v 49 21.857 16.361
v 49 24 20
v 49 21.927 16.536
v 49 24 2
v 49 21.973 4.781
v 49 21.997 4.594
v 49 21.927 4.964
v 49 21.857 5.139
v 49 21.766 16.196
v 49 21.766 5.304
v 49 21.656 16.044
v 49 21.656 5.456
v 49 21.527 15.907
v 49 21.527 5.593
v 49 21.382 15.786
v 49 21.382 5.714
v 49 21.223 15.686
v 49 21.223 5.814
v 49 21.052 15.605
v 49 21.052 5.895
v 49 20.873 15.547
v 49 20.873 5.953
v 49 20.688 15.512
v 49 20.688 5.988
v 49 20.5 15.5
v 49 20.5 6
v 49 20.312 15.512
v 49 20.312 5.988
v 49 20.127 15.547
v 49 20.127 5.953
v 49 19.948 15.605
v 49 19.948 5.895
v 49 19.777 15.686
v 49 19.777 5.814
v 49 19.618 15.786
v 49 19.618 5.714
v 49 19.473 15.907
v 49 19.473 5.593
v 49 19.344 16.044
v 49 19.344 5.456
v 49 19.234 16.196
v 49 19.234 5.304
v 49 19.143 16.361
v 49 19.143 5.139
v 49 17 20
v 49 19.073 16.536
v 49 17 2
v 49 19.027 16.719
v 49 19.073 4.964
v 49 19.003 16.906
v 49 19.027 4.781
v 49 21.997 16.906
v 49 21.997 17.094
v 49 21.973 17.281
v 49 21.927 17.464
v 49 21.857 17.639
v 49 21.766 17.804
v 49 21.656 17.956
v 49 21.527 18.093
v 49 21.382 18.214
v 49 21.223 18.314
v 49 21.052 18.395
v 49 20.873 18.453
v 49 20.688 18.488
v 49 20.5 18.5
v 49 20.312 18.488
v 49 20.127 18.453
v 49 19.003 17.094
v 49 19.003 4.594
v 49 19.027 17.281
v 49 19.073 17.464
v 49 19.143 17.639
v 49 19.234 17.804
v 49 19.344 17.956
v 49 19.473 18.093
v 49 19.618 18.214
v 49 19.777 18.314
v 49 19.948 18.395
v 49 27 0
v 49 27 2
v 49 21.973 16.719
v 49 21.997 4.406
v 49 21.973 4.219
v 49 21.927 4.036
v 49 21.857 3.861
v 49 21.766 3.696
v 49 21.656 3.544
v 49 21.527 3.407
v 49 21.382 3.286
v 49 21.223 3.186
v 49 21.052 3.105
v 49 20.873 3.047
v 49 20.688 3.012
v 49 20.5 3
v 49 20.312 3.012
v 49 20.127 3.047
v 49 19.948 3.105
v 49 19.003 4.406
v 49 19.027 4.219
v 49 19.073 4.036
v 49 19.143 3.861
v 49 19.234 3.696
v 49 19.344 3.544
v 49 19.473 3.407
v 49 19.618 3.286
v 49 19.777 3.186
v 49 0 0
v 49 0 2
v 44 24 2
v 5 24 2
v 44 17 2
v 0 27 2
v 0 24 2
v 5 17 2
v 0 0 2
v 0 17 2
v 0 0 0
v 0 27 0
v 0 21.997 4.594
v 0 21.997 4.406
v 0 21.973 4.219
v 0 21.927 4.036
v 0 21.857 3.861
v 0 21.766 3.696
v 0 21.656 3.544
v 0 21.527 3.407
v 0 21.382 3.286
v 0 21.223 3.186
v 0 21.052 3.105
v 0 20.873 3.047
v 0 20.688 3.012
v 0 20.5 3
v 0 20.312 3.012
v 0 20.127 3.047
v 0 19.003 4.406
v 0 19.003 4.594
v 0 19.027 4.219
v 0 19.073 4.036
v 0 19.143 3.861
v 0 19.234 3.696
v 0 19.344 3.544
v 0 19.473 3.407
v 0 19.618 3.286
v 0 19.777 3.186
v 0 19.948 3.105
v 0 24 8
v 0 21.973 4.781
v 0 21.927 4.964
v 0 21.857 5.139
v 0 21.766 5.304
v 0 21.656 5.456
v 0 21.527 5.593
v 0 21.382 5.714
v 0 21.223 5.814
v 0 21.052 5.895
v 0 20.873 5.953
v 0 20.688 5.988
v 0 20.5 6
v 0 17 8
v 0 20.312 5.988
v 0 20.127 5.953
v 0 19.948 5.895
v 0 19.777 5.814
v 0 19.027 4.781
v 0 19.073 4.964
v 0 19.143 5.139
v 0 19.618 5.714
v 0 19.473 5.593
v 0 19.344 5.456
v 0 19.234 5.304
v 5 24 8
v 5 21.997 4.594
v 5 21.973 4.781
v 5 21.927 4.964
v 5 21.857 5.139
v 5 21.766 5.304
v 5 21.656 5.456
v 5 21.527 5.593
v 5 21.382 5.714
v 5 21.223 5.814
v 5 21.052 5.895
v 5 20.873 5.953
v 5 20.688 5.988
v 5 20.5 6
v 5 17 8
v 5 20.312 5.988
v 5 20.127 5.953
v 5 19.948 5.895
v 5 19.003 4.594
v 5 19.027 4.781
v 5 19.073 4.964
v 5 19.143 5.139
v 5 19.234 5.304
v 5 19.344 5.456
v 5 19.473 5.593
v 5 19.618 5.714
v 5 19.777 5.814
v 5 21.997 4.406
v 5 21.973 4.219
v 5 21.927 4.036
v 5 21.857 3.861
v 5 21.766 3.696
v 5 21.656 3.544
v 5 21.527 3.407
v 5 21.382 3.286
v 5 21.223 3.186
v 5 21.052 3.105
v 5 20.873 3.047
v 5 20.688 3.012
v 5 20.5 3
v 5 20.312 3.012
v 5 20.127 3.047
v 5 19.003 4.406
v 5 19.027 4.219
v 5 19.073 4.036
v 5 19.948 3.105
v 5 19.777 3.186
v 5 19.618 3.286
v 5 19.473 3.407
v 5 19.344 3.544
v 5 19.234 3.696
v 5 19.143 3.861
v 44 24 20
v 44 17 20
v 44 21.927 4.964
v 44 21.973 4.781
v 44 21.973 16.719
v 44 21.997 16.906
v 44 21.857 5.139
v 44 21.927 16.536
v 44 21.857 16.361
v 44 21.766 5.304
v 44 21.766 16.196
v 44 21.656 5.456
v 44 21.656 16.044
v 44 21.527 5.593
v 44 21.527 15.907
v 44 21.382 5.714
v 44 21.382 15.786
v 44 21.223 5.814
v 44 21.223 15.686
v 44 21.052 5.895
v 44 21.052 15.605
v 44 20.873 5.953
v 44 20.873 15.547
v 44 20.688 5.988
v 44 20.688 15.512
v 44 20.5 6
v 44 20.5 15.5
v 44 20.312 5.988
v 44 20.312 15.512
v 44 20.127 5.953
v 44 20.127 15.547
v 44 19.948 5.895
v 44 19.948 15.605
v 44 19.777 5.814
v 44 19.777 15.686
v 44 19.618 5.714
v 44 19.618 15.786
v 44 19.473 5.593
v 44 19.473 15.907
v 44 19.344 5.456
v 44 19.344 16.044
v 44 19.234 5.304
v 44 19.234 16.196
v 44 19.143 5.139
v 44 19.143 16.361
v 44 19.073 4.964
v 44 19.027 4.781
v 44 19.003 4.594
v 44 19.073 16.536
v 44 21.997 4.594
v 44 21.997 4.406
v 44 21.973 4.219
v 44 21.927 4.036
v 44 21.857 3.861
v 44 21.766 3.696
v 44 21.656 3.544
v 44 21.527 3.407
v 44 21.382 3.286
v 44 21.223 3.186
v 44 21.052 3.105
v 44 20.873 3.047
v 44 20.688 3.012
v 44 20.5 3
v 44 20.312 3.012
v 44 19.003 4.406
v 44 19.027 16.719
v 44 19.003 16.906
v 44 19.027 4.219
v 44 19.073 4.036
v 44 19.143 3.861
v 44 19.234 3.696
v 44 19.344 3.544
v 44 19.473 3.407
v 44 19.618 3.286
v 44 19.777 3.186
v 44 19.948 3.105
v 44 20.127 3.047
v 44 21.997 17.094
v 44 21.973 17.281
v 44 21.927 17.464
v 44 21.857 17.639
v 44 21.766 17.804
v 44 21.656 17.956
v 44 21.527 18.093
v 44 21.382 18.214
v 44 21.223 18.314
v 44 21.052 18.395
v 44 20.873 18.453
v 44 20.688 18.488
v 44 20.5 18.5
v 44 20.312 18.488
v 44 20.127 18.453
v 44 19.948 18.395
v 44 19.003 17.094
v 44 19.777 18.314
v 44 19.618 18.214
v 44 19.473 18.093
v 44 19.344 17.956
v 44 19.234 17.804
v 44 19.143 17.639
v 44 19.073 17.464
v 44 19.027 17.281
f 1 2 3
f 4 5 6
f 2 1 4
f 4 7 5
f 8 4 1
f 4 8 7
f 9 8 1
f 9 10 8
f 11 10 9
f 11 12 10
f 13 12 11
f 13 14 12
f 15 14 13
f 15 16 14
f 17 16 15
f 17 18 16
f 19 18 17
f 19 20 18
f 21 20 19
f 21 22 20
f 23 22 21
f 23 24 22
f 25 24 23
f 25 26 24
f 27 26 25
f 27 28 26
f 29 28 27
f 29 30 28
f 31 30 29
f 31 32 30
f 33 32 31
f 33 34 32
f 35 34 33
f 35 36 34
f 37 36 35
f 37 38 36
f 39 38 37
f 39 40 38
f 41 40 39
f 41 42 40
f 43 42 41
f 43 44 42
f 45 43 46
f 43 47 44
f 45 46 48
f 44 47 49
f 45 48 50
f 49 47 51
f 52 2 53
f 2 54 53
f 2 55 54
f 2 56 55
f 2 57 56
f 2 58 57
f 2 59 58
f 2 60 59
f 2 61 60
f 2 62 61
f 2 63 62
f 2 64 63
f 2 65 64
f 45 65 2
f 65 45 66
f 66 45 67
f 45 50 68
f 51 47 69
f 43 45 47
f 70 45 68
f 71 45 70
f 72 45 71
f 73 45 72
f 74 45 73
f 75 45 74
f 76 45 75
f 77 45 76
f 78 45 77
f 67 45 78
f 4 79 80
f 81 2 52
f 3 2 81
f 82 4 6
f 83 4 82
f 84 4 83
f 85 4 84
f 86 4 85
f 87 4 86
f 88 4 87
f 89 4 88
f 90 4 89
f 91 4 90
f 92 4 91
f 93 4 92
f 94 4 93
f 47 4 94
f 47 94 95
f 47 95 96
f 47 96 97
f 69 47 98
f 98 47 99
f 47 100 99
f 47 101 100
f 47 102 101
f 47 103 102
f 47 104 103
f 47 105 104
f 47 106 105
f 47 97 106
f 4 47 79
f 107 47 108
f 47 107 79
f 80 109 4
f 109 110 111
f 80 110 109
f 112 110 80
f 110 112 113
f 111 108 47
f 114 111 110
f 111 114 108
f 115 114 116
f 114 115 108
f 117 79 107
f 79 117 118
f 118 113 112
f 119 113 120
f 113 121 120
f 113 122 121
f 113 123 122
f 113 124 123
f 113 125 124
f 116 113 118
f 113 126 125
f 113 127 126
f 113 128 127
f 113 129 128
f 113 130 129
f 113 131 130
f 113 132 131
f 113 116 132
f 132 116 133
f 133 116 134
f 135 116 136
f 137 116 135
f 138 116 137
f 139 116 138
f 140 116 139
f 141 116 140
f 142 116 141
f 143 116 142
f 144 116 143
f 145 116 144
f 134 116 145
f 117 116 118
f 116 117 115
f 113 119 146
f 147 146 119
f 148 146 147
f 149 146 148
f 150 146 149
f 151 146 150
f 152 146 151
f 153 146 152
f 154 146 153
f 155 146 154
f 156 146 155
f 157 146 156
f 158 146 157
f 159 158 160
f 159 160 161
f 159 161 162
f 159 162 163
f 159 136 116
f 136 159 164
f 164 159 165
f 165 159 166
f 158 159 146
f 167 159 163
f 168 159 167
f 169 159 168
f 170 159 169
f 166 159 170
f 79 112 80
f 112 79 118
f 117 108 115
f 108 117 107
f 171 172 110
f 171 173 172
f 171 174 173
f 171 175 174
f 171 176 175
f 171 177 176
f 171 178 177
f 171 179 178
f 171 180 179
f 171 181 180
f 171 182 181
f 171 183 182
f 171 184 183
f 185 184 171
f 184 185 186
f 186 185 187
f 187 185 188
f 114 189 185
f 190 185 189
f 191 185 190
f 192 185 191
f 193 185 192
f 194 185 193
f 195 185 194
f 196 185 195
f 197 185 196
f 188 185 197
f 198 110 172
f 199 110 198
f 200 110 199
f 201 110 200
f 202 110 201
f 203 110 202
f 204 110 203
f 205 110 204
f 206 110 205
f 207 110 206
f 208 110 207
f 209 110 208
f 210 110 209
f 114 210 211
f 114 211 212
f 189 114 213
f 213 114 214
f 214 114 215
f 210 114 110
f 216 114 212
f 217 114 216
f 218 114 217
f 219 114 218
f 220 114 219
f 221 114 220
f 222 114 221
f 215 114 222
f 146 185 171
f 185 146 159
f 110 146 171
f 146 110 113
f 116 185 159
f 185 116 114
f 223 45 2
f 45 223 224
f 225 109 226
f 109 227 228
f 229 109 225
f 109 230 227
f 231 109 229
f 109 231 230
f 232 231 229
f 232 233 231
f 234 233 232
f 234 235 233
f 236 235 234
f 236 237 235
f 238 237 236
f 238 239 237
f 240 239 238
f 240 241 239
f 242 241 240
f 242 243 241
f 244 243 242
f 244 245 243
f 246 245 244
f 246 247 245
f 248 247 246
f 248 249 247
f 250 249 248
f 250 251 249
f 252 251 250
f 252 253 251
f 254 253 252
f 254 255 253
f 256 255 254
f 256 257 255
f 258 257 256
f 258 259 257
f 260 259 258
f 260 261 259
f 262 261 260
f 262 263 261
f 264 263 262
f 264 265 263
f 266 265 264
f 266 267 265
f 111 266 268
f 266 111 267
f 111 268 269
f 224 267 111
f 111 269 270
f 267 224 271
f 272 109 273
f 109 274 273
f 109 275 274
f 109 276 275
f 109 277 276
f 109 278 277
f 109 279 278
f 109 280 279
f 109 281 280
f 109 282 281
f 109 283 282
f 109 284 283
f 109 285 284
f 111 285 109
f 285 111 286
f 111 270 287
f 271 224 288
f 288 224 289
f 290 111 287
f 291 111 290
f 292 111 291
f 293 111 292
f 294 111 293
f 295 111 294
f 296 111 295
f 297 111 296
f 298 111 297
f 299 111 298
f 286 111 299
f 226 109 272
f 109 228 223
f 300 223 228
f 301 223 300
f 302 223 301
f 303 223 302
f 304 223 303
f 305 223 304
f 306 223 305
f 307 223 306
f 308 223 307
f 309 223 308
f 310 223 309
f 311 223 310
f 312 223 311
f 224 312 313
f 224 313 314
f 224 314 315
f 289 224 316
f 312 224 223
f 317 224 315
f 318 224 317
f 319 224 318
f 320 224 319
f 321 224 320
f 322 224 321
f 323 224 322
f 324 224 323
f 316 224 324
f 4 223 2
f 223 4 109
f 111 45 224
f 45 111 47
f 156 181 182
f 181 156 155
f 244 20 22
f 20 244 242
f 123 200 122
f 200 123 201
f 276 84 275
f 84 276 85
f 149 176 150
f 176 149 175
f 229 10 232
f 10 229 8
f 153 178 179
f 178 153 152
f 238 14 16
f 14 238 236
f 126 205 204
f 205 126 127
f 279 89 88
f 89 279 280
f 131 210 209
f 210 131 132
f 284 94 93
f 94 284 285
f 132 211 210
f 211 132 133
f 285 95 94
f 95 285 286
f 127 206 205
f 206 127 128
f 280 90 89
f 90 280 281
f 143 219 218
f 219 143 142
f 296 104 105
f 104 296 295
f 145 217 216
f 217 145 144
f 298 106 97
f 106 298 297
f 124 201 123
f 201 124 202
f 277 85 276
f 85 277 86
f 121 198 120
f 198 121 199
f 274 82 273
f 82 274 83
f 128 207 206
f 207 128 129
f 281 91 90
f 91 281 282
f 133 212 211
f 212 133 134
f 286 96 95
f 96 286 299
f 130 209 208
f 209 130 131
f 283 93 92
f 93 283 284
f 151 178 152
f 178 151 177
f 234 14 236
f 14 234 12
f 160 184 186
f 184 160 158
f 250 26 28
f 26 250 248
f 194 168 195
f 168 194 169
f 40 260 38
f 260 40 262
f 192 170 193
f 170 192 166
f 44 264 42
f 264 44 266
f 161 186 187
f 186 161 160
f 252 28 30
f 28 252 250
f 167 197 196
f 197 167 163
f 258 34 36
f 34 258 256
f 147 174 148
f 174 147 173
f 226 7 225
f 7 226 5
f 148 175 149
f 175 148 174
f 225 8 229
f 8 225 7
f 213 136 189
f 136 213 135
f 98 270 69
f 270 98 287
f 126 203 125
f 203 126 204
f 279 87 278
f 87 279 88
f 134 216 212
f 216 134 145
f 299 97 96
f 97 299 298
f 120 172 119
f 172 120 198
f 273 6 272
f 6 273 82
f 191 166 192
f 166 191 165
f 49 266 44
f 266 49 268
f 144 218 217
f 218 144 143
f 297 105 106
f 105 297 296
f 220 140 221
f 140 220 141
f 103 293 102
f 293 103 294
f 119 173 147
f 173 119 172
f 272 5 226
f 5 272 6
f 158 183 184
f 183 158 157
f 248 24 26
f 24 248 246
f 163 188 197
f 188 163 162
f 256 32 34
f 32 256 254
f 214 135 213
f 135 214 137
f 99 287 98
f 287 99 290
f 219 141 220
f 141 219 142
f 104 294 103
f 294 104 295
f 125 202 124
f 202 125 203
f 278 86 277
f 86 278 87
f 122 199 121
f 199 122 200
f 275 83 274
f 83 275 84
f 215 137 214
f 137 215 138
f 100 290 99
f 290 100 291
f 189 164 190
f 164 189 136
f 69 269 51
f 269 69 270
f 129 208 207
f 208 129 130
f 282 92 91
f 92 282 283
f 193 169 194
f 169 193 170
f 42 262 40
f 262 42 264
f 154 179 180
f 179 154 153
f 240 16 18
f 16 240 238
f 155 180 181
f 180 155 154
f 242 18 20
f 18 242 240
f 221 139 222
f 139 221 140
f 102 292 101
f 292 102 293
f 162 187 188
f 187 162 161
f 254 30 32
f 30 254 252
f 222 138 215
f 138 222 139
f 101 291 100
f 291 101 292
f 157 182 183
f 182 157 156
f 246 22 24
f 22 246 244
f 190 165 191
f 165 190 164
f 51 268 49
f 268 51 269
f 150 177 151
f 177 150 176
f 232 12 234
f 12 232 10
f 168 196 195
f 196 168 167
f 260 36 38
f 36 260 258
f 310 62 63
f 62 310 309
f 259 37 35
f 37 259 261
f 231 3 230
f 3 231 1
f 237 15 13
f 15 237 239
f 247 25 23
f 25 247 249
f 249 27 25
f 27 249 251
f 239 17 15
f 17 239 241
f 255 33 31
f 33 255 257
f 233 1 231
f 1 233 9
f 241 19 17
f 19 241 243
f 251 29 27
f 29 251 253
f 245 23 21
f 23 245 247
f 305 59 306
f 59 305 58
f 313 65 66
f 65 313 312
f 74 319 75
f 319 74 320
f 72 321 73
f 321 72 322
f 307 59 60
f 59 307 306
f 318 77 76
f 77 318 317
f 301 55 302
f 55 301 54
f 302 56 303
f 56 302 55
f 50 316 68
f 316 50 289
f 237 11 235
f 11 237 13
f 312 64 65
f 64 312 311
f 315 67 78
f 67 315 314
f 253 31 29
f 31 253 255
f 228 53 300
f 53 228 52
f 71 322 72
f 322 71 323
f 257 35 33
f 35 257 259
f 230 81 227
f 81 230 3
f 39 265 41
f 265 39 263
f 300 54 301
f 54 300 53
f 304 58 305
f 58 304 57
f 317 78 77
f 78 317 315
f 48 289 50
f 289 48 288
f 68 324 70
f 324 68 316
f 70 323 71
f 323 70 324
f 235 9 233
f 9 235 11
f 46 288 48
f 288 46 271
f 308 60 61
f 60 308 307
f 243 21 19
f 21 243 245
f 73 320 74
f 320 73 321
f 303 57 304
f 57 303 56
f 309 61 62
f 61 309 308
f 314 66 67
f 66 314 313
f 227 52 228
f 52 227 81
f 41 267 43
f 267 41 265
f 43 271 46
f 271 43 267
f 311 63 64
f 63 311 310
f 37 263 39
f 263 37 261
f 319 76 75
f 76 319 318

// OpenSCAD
$fn = 50;

// Global dimensions
width = 60; //largeur
length = 85; //longueur
height = 70; //hauteur
thickness = 2; //épaisseur


// Sensor modules //

module led(w,l,h){
    difference(){
        cube([l,w,h]);
        translate([1,1,-1]) cube([l-2,w-2,h+10]);
    }
}

//led(8,6,5);

module temperatureSensor(w,l,h){
    difference(){
        cube([l,w,h]);
        translate([1,1,-1]) cube([l-2,w-2,h+10]);
    }
}

//temperatureSensor(10,15,15);


// All modules of a Block //

module partitionWallsLeft(w,l,h,t){
    cube([l,w,t]);
    //cube([l,t,h]); // middle side
    translate([0,w-t,0]) cube([l,t,h*sin(30)]);
}

module partitionWallsRight(w,l,h,t){
    translate([0,-w,0]) {
        cube([l,w,t]);
        //cube([l,t,h]); // middle side
        cube([l,t,h*sin(30)]);
    }
}
// left side wall
module blockLeft(w,l,h,t){
    difference(){
        cube([t,w,h]);
        translate([-20,w,h*sin(30)]) rotate([60,0,0]) cube([l,w,h]); // roof
        //translate([-20,0,h-14]) rotate([45,0,0]) cube([l,12,12]);
    }
}

// right side wall
module blockRight(w,l,h,t){
    difference(){
        translate([0,-w,0]) cube([t,w,h]);
        translate([-20,0,h*sin(90)]) rotate([120,0,0]) cube([l,w,h]); // roof
    }
}

module roof(w,l,h,t){
    translate([0,-w-15,0]) {
        cube([l*2,w+25,t]);
        translate([5,15,-10]) cube([10,w,t+10]);
        translate([(l*2)-15,15,-10]) cube([10,w,t+10]);
        
        // for start:increment:end
        /*for(x=[0:20:140]) { 
            translate([0,x,t]) cube([l*2,5,t]);
        }*/
    }
    
    /*difference() {
                        translate([0,-0.65,-5]) rotate([-30,0,0]) cube([l*2,5,12]);
        translate([0,-w-20,t]) cube([l*2,w+50,h]);
        }*/
}

module door(w,l,h,t){
    difference(){
        union(){
            cube([w-11,w/2-3,t]);
            translate([0,17,0]) cube([5,7,8]);
            translate([w-16,17,0]) cube([5,7,20]);
        }
        
        // Cylinder hole
        translate([-1,20.5,4.5]) rotate([0,90,0]) cylinder(  100,1.5,1.5);
        translate([-1,20.5,17]) rotate([0,90,0]) cylinder(  100,1.5,1.5);
    }
}


// union of 2 blocks
module blockEntrance(w,l,h,t){
    // Block 1
    difference(){
        blockLeft(w,l,h,t);
        translate([w-20,w-10,t*1.01]) cube([40,40,h*sin(30)/1.5]);
    }
    
    // Block 2
    translate([l-t,0,0]) difference() {
        blockLeft(w,l,h,t);
        translate([-10,w/3,t*1.01]) cube([40,20,h*sin(30)/1.5]);
    }
    
    // Walls and sensors
    translate([t,w/4-5,t]) led(8,6,15);
    translate([l/2,w/4-5,t]) led(8,6,15);
    difference(){
        partitionWallsLeft(w,l,h,t);
        translate([3,w/4-4,-1]) cube([6-2,8-2,5+10]); //led cables
        translate([l/2+1,w/4-4,-1]) cube([6-2,8-2,5+10]); //led cables
        
        // LCD sceen
        translate([5,w-t-1,10]) cube([40,t+2,13]);
        translate([l/2,w/3-2,-1]) cube([6,w/4-1,5+10]);
    }
    
    // Entrance door
    difference(){
        translate([l/2+10,w-4,0.01]) cube([20,t+4,h*sin(30)/1.4]);
        translate([l/2+12.5,50,-0.01]) cube([15,30,h*sin(30)/1.6]);
    }
    
    // Center partition wall
    difference(){
        cube([l,t,h*sin(30)]);
        translate([l/2+10,-10,t*1.01]) cube([20,40,h*sin(30)/1.5]);
        translate([l/4-10,-10,t*1.01]) cube([20,40,h*sin(30)/1.5]);
    }
    
    // Bathroom
    translate([0,w/2,t*0.01]) cube([l/2,t,h*sin(30)]);
    translate([l/2,0,0]) rotate([0,0,90]) cube([w/2,t,h*sin(30)]);
}

module blockRoom(w,l,h,t){
    // Block 1
    blockRight(w,l,h,t);
    
    // Block 2 
    difference(){
        translate([l-t,0,0]) blockRight(w,l,h,t);
        translate([l-10,-w/2,t*1.01]) cube([40,20,h*sin(30)/1.5]);
    }
    
    // Walls and sensors
    translate([2,-w/2-5,t]) led(8,6,15);
    difference(){
        partitionWallsRight(w,l,h,t);
        translate([3,-w/2-4,-1]) cube([6-2,8-2,5+10]); //led cables
    }
}

module blockKitchen(w,l,h,t){
    
    // Block 2 
    translate([l-t,0,0]) blockRight(w,l,h,t);
    
    // Walls and sensors
    translate([l/2,-w+t,t]) temperatureSensor(10,15,15);
    translate([l-t*4,-w/2-5,t]) led(8,6,15);
    difference(){
        partitionWallsRight(w,l,h,t);
        translate([l/2+1,-w+t+1,-1]) cube([15-2,10-2,15+10]);
        translate([l-t*4+1,-w/2-4,-1]) cube([6-2,8-2,5+10]); //led cables
    }
}

// union of 2 blocks
module blockGarage(w,l,h,t){
    // Block 2
    translate([l-t,0,0]){
        blockLeft(w,l,h,t);
    }
    
    // Center partition wall
    cube([l,t,h*sin(30)]);
    
    // Walls, sensor and garage door
    translate([l-t*4,2,t]) led(8,6,15);
    difference(){
        partitionWallsLeft(w,l,h,t);
        translate([l/6-t*2+5,w-10,t*1.01]) cube([w-10,w/2,w/2-2]); // Garage hole
        translate([l-t*4+1,3,-1]) cube([6-2,8-2,5+10]); // Led cables
        translate([w-5,l/2-10,-1]) cube([10,20,10]); // Garage cables
    }
    
    // Garage plot
    difference() {
        // Plot
        color("red") union(){
            translate([10.17,w-7,0]) cube([5,7-0.1,h/2-5]);
            translate([l-20+0.165,w-7,0]) cube([5,7-0.1,h/2-5]);
        }
        
        // Cylinder hole
        translate([0,w-4.5,w/2-7]) rotate([0,90,0]) cylinder(100,1.5,1.5);
    }
}



// all shapes //

fondation = false;
print = true;

if (print == true){
    // Fondation
    if (fondation == true){
        union(){
            blockEntrance(width,length,height,thickness);
            blockRoom(width,length,height,thickness);
            translate([length,0,0]) blockGarage(width,length,height,thickness);
            translate([length,0,0]) blockKitchen(width,length,height,thickness);    
        }
    }
    color("blue") union(){
        // Roof
        //rotate([180,0,0]) roof(width,length,height,thickness);
        
        // Door
        door(width,length,height,thickness);
    }
    
} else {
    // Fondation
    if (fondation == true){
        union(){
            blockEntrance(width,length,height,thickness);
            blockRoom(width,length,height,thickness);
            translate([length,0,0]) blockGarage(width,length,height,thickness);
            translate([length,0,0]) blockKitchen(width,length,height,thickness);    
        }
    }
    
    color("blue") union(){
        // Roof
        //translate([0,0,height]) rotate([30,0,0]) roof(width,length,height,thickness);
        
        // Door
        translate([length+15.5,width,2.5]) rotate([90,0,0]) door(width,length,height,thickness);
    }
}
